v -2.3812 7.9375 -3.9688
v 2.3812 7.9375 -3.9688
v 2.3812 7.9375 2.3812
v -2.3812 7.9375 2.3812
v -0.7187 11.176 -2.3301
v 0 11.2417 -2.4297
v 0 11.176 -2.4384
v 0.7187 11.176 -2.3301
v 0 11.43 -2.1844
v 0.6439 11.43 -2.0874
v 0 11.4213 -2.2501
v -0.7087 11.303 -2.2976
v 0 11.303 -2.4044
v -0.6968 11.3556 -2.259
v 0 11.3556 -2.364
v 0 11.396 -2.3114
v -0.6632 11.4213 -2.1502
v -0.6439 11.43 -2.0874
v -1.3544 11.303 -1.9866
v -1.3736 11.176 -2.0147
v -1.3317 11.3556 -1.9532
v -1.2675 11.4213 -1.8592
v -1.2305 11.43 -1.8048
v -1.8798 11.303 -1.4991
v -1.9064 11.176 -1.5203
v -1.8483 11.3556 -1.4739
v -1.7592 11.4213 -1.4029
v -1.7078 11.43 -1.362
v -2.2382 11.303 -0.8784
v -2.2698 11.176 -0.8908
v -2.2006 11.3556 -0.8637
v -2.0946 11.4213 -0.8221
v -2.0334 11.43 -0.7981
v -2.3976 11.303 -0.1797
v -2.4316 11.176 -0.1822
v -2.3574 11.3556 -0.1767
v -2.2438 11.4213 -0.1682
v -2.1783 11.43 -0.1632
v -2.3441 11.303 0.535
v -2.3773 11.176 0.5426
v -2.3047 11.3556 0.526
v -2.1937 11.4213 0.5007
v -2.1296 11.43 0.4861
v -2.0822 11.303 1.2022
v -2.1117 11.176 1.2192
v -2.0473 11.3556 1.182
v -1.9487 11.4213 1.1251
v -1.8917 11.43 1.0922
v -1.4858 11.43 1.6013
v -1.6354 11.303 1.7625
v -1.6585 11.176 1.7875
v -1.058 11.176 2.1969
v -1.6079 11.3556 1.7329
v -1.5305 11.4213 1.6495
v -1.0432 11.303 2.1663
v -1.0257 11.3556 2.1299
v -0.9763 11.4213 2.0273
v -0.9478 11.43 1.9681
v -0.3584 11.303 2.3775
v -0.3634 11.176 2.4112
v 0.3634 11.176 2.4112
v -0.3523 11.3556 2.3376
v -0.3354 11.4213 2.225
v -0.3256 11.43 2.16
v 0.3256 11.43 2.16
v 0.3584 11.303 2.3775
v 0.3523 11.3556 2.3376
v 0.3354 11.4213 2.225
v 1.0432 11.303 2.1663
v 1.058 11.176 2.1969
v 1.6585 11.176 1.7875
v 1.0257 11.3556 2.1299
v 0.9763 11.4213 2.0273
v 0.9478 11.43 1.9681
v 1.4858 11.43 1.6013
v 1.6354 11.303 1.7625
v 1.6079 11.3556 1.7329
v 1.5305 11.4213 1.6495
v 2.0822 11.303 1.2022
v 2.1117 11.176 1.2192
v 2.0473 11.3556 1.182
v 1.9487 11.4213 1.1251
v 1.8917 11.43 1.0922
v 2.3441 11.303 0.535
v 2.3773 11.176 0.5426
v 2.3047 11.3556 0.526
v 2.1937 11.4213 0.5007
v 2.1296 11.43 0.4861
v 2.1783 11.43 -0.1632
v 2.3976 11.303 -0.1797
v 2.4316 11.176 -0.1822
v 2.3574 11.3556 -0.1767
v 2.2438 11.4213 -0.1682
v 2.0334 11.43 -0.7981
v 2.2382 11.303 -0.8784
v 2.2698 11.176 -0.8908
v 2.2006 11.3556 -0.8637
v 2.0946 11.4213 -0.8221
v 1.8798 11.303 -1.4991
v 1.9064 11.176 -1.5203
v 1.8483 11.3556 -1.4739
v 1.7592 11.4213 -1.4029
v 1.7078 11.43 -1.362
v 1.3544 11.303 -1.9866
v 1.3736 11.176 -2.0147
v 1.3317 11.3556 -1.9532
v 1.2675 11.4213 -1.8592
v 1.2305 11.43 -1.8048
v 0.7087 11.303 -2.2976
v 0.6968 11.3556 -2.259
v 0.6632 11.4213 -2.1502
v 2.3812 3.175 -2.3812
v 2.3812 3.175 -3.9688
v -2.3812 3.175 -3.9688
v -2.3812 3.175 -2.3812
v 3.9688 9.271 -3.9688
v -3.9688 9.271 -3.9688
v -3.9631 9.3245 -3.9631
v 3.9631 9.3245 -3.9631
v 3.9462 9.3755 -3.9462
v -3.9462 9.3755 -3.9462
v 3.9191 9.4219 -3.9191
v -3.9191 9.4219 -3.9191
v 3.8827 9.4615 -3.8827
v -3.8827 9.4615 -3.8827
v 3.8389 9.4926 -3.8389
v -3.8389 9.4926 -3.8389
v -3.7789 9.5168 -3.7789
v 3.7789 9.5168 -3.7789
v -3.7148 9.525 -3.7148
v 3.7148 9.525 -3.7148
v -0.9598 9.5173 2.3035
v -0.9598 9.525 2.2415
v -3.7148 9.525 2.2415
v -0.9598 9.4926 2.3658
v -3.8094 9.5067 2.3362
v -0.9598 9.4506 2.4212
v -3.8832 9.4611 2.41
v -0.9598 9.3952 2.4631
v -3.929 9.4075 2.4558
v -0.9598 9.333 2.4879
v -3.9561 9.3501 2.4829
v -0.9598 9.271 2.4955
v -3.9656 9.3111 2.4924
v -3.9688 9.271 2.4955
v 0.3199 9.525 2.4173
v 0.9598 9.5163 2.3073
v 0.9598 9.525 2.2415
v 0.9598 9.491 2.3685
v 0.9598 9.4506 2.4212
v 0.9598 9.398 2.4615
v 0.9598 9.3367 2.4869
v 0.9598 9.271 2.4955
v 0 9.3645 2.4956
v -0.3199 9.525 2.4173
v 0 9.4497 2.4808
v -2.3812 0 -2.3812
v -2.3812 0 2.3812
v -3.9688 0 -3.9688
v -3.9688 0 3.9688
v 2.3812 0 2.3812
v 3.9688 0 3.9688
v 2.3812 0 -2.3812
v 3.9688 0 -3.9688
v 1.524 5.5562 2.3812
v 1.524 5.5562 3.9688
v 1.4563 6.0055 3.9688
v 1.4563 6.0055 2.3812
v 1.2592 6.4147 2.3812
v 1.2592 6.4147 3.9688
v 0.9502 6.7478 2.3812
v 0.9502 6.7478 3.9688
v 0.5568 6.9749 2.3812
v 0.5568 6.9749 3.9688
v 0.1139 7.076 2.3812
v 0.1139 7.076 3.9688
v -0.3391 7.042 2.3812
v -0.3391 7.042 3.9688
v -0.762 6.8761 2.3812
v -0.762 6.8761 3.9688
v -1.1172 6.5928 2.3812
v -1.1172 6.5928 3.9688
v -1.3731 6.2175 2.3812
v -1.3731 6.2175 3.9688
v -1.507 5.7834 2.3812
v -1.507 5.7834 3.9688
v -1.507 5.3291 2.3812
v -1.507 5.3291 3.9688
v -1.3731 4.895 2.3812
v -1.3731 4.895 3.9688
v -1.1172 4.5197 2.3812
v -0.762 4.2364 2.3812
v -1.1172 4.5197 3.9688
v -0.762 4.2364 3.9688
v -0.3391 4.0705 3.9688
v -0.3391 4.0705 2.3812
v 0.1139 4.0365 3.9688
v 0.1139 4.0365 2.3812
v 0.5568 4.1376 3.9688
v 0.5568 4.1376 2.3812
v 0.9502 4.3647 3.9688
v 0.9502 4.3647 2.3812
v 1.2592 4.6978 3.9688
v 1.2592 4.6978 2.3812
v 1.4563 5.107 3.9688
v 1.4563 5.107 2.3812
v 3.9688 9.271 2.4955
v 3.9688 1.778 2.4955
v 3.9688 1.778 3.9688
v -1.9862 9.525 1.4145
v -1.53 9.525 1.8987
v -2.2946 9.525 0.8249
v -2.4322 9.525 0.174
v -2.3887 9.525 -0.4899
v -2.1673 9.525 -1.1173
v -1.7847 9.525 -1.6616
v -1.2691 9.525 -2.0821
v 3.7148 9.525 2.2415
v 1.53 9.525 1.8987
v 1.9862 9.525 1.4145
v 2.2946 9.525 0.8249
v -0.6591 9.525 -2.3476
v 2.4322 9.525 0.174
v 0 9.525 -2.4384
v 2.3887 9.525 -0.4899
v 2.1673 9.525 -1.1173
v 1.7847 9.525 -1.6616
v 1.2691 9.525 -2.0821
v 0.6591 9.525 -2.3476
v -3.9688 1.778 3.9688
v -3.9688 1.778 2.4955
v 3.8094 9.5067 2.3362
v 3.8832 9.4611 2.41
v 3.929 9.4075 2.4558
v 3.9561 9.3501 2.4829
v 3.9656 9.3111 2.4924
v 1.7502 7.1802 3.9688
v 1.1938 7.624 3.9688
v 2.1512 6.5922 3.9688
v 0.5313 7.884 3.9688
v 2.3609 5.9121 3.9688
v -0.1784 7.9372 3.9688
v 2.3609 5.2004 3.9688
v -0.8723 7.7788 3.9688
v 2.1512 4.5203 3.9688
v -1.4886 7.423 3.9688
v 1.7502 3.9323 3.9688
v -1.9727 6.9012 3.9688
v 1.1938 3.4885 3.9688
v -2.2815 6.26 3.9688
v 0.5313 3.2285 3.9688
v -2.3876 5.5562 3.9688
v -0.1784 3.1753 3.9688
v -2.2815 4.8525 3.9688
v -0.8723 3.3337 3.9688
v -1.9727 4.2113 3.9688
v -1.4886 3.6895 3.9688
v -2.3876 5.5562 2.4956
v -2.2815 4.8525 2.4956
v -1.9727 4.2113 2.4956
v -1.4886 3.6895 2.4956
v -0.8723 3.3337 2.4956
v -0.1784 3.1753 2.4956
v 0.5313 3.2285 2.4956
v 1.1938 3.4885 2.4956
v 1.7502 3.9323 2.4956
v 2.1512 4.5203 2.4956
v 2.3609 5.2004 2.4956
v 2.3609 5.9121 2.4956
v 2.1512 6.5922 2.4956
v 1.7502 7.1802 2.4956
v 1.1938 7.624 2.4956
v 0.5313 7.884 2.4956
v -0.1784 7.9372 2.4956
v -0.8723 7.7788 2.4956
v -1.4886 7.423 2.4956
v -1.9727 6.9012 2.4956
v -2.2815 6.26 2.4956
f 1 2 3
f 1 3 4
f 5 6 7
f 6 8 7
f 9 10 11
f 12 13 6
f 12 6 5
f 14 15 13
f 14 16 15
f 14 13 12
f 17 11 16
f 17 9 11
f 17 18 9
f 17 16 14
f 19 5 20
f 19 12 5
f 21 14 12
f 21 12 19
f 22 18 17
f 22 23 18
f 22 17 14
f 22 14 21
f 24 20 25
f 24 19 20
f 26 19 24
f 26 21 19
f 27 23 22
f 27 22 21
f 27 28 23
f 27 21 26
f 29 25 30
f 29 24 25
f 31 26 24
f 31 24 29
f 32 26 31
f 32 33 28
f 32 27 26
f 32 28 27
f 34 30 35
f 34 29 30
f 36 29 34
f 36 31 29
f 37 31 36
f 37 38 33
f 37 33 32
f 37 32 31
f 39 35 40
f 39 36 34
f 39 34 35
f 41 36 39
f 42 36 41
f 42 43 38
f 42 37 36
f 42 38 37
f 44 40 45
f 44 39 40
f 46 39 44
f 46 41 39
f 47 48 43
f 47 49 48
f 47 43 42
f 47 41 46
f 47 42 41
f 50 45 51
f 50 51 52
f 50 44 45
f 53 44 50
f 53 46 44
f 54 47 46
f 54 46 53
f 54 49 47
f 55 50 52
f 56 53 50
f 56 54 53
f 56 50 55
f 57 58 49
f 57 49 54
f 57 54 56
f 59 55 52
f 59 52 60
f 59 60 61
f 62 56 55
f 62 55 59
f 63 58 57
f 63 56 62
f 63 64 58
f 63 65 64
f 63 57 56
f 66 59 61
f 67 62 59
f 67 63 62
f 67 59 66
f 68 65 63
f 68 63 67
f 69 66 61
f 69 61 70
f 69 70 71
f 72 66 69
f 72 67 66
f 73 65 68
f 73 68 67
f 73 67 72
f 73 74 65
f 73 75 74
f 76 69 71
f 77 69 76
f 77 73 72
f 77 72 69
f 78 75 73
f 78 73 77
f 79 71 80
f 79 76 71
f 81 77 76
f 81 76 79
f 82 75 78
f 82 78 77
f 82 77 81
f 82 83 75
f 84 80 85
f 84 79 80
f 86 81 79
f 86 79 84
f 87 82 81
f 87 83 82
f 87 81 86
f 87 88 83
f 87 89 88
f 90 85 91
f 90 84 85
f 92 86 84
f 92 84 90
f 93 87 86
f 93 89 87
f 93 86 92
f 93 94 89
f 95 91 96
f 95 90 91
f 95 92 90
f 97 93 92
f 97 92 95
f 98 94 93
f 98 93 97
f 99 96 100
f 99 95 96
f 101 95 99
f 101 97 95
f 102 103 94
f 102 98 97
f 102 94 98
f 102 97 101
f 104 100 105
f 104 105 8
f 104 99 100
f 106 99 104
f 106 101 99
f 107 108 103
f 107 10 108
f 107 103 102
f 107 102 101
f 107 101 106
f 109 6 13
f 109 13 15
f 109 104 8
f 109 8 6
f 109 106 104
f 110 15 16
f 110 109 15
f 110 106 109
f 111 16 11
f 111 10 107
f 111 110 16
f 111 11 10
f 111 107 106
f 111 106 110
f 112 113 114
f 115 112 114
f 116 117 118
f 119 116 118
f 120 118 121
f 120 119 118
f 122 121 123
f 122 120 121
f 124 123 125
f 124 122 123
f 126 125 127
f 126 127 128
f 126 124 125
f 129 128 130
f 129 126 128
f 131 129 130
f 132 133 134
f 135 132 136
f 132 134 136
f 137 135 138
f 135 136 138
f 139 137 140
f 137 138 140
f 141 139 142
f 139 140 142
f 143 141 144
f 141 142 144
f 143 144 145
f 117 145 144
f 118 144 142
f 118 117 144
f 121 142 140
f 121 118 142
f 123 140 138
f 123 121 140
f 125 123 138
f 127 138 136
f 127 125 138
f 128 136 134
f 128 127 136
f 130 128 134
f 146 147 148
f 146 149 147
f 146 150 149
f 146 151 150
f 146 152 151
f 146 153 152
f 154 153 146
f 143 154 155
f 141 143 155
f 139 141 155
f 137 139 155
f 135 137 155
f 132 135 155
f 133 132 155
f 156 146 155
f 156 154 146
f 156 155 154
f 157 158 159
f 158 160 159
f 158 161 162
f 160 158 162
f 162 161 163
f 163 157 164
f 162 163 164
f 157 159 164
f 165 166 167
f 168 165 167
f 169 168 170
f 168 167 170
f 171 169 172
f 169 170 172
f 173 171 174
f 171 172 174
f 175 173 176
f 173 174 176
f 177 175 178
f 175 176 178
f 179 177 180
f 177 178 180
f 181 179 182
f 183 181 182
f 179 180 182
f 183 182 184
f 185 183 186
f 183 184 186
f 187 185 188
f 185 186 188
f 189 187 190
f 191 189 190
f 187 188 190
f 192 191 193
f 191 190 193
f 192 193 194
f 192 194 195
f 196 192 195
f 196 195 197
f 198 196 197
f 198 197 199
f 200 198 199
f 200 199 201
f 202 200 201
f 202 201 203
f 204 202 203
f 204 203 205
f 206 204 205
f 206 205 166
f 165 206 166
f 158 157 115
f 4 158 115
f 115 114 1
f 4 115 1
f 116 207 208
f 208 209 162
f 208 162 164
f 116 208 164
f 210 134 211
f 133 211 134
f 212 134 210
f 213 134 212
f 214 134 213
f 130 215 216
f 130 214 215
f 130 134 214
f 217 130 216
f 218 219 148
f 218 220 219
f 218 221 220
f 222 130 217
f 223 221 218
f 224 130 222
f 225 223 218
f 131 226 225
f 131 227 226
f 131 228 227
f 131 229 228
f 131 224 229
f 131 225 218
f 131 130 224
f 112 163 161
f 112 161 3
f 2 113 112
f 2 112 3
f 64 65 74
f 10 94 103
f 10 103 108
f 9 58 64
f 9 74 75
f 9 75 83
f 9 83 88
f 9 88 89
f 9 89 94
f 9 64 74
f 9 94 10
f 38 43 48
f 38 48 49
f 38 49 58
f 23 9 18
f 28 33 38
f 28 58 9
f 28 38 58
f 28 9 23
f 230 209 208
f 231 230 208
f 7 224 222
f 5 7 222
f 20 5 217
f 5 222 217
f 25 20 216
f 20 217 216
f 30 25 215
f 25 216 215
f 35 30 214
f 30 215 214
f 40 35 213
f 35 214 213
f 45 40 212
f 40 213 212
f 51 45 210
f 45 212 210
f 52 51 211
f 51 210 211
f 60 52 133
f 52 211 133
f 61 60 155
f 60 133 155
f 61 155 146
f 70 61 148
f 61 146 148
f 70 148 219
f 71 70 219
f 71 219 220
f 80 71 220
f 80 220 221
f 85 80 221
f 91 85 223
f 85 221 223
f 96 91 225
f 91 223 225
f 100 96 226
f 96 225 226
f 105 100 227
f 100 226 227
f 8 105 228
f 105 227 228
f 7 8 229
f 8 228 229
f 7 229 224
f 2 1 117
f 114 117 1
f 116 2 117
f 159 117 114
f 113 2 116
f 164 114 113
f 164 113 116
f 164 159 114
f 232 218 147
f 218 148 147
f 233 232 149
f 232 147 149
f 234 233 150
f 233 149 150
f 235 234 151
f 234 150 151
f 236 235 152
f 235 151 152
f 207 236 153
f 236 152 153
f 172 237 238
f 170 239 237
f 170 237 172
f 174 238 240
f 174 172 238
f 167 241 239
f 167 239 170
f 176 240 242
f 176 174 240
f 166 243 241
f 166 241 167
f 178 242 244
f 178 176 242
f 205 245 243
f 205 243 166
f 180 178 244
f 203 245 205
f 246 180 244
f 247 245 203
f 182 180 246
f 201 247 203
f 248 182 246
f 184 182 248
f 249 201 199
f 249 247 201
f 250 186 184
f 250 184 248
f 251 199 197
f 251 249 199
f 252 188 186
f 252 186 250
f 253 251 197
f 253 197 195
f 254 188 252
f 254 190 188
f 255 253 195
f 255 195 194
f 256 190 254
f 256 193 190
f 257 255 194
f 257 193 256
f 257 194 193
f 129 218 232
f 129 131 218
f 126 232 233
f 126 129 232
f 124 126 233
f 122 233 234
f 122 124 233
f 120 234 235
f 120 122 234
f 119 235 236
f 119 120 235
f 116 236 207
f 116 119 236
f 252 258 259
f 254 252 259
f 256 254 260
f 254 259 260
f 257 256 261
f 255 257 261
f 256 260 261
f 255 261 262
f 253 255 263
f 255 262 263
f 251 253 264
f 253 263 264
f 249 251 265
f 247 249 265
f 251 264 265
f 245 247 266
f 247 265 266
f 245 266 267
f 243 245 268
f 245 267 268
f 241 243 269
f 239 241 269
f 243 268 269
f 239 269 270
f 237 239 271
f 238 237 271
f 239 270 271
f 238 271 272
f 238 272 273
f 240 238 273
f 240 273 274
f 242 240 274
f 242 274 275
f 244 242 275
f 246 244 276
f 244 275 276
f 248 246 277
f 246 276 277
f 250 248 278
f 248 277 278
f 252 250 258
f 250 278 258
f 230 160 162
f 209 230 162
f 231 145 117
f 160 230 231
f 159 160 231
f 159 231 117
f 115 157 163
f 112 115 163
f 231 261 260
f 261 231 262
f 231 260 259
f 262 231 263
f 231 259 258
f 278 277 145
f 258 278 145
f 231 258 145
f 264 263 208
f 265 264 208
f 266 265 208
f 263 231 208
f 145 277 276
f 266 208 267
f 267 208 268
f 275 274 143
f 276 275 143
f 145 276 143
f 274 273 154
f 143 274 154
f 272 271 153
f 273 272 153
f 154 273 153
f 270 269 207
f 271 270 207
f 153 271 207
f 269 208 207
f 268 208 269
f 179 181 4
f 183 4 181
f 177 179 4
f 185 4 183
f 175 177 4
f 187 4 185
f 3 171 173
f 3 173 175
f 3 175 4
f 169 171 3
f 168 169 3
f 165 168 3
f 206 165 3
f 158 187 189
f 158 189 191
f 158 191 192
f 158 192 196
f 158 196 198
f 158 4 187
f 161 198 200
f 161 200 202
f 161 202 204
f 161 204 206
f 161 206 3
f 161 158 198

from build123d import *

# Parameters (mm, degrees)
SKETCH1_W           = 7.9375
SKETCH1_H           = 7.9375
BASE_EXTRUDE_DEPTH  = 9.525
SKETCH2_R           = 2.4384
BOSS_EXTRUDE1_DEPTH = 1.905
SKETCH3_W           = 1.4732
SKETCH3_H           = 7.747
CUT_EXTRUDE1_DEPTH  = 15.470652467
FILLET1_R           = 0.254
SKETCH4_W           = 4.7625
SKETCH4_H           = 4.7625
CUT_EXTRUDE2_DEPTH  = 7.9375
CUT_EXTRUDE3_REACH  = 16.471
SKETCH5_W           = 4.7625
SKETCH5_H           = 4.7625
SKETCH6_R           = 2.3876
BOSS_EXTRUDE2_DEPTH = 1.4732
CUT_EXTRUDE4_REACH  = 16.471
SKETCH7_R           = 1.524


with BuildPart() as part:
    # Sketch1 → Base-Extrude (new body)
    with BuildSketch(Plane(origin=(0, 0, 0), x_dir=(1, 0, 0), z_dir=(0, 1, 0))):
        Rectangle(SKETCH1_W, SKETCH1_H)
    extrude(amount=BASE_EXTRUDE_DEPTH)

    # Sketch2 → Boss-Extrude1 (add)
    with BuildSketch(Plane(origin=(0, 9.525, 0), x_dir=(-1, 0, 0), z_dir=(0, 1, 0))):
        with Locations(Location((0, 0, 0), (0, 0, 270))):
            Circle(SKETCH2_R)
    extrude(amount=BOSS_EXTRUDE1_DEPTH)

    # Sketch3 → Cut-Extrude1 (cut, through all)
    with BuildSketch(Plane(origin=(3.96875, 0, 0), x_dir=(0, 0, -1), z_dir=(1, 0, 0))):
        with Locations((-3.23215, 5.6515)):
            Rectangle(SKETCH3_W, SKETCH3_H)
    extrude(amount=-CUT_EXTRUDE1_DEPTH, mode=Mode.SUBTRACT)

    # Fillet1
    fillet1_edges = [part.edges().sort_by_distance(p)[0] for p in [
        (0, 9.525, -3.96875),
        (0, 11.43, 2.4384),
        (3.96875, 9.525, -0.7366),
        (0, 9.525, 2.49555),
        (-3.96875, 9.525, -0.7366),
    ]]
    fillet(fillet1_edges, radius=FILLET1_R)

    # Sketch4 → Cut-Extrude2 (cut)
    with BuildSketch(Plane.XZ):
        Rectangle(SKETCH4_W, SKETCH4_H)
    extrude(amount=-CUT_EXTRUDE2_DEPTH, mode=Mode.SUBTRACT)

    # Sketch5 → Cut-Extrude3 (cut, up to next)
    with BuildSketch(Plane(origin=(0, 0, -3.96875), x_dir=(-1, 0, 0), z_dir=(0, 0, -1)), mode=Mode.PRIVATE) as cut_extrude3_sk1:
        with Locations((0, 5.55625)):
            Rectangle(SKETCH5_W, SKETCH5_H)
    cut_extrude3_tool1 = extrude(cut_extrude3_sk1.sketch, amount=-CUT_EXTRUDE3_REACH, mode=Mode.PRIVATE) & part.part
    add(cut_extrude3_tool1.solids().sort_by_distance((0, 5.55625, -3.96875))[0], mode=Mode.SUBTRACT)

    # Sketch6 → Boss-Extrude2 (add)
    with BuildSketch(Plane.XY.offset(2.49555)):
        with Locations(Location((0, 5.55625, 0), (0, 0, 180))):
            Circle(SKETCH6_R)
    extrude(amount=BOSS_EXTRUDE2_DEPTH)

    # Sketch7 → Cut-Extrude4 (cut, up to next)
    with BuildSketch(Plane.XY.offset(3.96875), mode=Mode.PRIVATE) as cut_extrude4_sk1:
        with Locations((0, 5.55625)):
            Circle(SKETCH7_R)
    cut_extrude4_tool1 = extrude(cut_extrude4_sk1.sketch, amount=-CUT_EXTRUDE4_REACH, mode=Mode.PRIVATE) & part.part
    add(cut_extrude4_tool1.solids().sort_by_distance((0, 5.55625, 3.96875))[0], mode=Mode.SUBTRACT)


solid = part.part
